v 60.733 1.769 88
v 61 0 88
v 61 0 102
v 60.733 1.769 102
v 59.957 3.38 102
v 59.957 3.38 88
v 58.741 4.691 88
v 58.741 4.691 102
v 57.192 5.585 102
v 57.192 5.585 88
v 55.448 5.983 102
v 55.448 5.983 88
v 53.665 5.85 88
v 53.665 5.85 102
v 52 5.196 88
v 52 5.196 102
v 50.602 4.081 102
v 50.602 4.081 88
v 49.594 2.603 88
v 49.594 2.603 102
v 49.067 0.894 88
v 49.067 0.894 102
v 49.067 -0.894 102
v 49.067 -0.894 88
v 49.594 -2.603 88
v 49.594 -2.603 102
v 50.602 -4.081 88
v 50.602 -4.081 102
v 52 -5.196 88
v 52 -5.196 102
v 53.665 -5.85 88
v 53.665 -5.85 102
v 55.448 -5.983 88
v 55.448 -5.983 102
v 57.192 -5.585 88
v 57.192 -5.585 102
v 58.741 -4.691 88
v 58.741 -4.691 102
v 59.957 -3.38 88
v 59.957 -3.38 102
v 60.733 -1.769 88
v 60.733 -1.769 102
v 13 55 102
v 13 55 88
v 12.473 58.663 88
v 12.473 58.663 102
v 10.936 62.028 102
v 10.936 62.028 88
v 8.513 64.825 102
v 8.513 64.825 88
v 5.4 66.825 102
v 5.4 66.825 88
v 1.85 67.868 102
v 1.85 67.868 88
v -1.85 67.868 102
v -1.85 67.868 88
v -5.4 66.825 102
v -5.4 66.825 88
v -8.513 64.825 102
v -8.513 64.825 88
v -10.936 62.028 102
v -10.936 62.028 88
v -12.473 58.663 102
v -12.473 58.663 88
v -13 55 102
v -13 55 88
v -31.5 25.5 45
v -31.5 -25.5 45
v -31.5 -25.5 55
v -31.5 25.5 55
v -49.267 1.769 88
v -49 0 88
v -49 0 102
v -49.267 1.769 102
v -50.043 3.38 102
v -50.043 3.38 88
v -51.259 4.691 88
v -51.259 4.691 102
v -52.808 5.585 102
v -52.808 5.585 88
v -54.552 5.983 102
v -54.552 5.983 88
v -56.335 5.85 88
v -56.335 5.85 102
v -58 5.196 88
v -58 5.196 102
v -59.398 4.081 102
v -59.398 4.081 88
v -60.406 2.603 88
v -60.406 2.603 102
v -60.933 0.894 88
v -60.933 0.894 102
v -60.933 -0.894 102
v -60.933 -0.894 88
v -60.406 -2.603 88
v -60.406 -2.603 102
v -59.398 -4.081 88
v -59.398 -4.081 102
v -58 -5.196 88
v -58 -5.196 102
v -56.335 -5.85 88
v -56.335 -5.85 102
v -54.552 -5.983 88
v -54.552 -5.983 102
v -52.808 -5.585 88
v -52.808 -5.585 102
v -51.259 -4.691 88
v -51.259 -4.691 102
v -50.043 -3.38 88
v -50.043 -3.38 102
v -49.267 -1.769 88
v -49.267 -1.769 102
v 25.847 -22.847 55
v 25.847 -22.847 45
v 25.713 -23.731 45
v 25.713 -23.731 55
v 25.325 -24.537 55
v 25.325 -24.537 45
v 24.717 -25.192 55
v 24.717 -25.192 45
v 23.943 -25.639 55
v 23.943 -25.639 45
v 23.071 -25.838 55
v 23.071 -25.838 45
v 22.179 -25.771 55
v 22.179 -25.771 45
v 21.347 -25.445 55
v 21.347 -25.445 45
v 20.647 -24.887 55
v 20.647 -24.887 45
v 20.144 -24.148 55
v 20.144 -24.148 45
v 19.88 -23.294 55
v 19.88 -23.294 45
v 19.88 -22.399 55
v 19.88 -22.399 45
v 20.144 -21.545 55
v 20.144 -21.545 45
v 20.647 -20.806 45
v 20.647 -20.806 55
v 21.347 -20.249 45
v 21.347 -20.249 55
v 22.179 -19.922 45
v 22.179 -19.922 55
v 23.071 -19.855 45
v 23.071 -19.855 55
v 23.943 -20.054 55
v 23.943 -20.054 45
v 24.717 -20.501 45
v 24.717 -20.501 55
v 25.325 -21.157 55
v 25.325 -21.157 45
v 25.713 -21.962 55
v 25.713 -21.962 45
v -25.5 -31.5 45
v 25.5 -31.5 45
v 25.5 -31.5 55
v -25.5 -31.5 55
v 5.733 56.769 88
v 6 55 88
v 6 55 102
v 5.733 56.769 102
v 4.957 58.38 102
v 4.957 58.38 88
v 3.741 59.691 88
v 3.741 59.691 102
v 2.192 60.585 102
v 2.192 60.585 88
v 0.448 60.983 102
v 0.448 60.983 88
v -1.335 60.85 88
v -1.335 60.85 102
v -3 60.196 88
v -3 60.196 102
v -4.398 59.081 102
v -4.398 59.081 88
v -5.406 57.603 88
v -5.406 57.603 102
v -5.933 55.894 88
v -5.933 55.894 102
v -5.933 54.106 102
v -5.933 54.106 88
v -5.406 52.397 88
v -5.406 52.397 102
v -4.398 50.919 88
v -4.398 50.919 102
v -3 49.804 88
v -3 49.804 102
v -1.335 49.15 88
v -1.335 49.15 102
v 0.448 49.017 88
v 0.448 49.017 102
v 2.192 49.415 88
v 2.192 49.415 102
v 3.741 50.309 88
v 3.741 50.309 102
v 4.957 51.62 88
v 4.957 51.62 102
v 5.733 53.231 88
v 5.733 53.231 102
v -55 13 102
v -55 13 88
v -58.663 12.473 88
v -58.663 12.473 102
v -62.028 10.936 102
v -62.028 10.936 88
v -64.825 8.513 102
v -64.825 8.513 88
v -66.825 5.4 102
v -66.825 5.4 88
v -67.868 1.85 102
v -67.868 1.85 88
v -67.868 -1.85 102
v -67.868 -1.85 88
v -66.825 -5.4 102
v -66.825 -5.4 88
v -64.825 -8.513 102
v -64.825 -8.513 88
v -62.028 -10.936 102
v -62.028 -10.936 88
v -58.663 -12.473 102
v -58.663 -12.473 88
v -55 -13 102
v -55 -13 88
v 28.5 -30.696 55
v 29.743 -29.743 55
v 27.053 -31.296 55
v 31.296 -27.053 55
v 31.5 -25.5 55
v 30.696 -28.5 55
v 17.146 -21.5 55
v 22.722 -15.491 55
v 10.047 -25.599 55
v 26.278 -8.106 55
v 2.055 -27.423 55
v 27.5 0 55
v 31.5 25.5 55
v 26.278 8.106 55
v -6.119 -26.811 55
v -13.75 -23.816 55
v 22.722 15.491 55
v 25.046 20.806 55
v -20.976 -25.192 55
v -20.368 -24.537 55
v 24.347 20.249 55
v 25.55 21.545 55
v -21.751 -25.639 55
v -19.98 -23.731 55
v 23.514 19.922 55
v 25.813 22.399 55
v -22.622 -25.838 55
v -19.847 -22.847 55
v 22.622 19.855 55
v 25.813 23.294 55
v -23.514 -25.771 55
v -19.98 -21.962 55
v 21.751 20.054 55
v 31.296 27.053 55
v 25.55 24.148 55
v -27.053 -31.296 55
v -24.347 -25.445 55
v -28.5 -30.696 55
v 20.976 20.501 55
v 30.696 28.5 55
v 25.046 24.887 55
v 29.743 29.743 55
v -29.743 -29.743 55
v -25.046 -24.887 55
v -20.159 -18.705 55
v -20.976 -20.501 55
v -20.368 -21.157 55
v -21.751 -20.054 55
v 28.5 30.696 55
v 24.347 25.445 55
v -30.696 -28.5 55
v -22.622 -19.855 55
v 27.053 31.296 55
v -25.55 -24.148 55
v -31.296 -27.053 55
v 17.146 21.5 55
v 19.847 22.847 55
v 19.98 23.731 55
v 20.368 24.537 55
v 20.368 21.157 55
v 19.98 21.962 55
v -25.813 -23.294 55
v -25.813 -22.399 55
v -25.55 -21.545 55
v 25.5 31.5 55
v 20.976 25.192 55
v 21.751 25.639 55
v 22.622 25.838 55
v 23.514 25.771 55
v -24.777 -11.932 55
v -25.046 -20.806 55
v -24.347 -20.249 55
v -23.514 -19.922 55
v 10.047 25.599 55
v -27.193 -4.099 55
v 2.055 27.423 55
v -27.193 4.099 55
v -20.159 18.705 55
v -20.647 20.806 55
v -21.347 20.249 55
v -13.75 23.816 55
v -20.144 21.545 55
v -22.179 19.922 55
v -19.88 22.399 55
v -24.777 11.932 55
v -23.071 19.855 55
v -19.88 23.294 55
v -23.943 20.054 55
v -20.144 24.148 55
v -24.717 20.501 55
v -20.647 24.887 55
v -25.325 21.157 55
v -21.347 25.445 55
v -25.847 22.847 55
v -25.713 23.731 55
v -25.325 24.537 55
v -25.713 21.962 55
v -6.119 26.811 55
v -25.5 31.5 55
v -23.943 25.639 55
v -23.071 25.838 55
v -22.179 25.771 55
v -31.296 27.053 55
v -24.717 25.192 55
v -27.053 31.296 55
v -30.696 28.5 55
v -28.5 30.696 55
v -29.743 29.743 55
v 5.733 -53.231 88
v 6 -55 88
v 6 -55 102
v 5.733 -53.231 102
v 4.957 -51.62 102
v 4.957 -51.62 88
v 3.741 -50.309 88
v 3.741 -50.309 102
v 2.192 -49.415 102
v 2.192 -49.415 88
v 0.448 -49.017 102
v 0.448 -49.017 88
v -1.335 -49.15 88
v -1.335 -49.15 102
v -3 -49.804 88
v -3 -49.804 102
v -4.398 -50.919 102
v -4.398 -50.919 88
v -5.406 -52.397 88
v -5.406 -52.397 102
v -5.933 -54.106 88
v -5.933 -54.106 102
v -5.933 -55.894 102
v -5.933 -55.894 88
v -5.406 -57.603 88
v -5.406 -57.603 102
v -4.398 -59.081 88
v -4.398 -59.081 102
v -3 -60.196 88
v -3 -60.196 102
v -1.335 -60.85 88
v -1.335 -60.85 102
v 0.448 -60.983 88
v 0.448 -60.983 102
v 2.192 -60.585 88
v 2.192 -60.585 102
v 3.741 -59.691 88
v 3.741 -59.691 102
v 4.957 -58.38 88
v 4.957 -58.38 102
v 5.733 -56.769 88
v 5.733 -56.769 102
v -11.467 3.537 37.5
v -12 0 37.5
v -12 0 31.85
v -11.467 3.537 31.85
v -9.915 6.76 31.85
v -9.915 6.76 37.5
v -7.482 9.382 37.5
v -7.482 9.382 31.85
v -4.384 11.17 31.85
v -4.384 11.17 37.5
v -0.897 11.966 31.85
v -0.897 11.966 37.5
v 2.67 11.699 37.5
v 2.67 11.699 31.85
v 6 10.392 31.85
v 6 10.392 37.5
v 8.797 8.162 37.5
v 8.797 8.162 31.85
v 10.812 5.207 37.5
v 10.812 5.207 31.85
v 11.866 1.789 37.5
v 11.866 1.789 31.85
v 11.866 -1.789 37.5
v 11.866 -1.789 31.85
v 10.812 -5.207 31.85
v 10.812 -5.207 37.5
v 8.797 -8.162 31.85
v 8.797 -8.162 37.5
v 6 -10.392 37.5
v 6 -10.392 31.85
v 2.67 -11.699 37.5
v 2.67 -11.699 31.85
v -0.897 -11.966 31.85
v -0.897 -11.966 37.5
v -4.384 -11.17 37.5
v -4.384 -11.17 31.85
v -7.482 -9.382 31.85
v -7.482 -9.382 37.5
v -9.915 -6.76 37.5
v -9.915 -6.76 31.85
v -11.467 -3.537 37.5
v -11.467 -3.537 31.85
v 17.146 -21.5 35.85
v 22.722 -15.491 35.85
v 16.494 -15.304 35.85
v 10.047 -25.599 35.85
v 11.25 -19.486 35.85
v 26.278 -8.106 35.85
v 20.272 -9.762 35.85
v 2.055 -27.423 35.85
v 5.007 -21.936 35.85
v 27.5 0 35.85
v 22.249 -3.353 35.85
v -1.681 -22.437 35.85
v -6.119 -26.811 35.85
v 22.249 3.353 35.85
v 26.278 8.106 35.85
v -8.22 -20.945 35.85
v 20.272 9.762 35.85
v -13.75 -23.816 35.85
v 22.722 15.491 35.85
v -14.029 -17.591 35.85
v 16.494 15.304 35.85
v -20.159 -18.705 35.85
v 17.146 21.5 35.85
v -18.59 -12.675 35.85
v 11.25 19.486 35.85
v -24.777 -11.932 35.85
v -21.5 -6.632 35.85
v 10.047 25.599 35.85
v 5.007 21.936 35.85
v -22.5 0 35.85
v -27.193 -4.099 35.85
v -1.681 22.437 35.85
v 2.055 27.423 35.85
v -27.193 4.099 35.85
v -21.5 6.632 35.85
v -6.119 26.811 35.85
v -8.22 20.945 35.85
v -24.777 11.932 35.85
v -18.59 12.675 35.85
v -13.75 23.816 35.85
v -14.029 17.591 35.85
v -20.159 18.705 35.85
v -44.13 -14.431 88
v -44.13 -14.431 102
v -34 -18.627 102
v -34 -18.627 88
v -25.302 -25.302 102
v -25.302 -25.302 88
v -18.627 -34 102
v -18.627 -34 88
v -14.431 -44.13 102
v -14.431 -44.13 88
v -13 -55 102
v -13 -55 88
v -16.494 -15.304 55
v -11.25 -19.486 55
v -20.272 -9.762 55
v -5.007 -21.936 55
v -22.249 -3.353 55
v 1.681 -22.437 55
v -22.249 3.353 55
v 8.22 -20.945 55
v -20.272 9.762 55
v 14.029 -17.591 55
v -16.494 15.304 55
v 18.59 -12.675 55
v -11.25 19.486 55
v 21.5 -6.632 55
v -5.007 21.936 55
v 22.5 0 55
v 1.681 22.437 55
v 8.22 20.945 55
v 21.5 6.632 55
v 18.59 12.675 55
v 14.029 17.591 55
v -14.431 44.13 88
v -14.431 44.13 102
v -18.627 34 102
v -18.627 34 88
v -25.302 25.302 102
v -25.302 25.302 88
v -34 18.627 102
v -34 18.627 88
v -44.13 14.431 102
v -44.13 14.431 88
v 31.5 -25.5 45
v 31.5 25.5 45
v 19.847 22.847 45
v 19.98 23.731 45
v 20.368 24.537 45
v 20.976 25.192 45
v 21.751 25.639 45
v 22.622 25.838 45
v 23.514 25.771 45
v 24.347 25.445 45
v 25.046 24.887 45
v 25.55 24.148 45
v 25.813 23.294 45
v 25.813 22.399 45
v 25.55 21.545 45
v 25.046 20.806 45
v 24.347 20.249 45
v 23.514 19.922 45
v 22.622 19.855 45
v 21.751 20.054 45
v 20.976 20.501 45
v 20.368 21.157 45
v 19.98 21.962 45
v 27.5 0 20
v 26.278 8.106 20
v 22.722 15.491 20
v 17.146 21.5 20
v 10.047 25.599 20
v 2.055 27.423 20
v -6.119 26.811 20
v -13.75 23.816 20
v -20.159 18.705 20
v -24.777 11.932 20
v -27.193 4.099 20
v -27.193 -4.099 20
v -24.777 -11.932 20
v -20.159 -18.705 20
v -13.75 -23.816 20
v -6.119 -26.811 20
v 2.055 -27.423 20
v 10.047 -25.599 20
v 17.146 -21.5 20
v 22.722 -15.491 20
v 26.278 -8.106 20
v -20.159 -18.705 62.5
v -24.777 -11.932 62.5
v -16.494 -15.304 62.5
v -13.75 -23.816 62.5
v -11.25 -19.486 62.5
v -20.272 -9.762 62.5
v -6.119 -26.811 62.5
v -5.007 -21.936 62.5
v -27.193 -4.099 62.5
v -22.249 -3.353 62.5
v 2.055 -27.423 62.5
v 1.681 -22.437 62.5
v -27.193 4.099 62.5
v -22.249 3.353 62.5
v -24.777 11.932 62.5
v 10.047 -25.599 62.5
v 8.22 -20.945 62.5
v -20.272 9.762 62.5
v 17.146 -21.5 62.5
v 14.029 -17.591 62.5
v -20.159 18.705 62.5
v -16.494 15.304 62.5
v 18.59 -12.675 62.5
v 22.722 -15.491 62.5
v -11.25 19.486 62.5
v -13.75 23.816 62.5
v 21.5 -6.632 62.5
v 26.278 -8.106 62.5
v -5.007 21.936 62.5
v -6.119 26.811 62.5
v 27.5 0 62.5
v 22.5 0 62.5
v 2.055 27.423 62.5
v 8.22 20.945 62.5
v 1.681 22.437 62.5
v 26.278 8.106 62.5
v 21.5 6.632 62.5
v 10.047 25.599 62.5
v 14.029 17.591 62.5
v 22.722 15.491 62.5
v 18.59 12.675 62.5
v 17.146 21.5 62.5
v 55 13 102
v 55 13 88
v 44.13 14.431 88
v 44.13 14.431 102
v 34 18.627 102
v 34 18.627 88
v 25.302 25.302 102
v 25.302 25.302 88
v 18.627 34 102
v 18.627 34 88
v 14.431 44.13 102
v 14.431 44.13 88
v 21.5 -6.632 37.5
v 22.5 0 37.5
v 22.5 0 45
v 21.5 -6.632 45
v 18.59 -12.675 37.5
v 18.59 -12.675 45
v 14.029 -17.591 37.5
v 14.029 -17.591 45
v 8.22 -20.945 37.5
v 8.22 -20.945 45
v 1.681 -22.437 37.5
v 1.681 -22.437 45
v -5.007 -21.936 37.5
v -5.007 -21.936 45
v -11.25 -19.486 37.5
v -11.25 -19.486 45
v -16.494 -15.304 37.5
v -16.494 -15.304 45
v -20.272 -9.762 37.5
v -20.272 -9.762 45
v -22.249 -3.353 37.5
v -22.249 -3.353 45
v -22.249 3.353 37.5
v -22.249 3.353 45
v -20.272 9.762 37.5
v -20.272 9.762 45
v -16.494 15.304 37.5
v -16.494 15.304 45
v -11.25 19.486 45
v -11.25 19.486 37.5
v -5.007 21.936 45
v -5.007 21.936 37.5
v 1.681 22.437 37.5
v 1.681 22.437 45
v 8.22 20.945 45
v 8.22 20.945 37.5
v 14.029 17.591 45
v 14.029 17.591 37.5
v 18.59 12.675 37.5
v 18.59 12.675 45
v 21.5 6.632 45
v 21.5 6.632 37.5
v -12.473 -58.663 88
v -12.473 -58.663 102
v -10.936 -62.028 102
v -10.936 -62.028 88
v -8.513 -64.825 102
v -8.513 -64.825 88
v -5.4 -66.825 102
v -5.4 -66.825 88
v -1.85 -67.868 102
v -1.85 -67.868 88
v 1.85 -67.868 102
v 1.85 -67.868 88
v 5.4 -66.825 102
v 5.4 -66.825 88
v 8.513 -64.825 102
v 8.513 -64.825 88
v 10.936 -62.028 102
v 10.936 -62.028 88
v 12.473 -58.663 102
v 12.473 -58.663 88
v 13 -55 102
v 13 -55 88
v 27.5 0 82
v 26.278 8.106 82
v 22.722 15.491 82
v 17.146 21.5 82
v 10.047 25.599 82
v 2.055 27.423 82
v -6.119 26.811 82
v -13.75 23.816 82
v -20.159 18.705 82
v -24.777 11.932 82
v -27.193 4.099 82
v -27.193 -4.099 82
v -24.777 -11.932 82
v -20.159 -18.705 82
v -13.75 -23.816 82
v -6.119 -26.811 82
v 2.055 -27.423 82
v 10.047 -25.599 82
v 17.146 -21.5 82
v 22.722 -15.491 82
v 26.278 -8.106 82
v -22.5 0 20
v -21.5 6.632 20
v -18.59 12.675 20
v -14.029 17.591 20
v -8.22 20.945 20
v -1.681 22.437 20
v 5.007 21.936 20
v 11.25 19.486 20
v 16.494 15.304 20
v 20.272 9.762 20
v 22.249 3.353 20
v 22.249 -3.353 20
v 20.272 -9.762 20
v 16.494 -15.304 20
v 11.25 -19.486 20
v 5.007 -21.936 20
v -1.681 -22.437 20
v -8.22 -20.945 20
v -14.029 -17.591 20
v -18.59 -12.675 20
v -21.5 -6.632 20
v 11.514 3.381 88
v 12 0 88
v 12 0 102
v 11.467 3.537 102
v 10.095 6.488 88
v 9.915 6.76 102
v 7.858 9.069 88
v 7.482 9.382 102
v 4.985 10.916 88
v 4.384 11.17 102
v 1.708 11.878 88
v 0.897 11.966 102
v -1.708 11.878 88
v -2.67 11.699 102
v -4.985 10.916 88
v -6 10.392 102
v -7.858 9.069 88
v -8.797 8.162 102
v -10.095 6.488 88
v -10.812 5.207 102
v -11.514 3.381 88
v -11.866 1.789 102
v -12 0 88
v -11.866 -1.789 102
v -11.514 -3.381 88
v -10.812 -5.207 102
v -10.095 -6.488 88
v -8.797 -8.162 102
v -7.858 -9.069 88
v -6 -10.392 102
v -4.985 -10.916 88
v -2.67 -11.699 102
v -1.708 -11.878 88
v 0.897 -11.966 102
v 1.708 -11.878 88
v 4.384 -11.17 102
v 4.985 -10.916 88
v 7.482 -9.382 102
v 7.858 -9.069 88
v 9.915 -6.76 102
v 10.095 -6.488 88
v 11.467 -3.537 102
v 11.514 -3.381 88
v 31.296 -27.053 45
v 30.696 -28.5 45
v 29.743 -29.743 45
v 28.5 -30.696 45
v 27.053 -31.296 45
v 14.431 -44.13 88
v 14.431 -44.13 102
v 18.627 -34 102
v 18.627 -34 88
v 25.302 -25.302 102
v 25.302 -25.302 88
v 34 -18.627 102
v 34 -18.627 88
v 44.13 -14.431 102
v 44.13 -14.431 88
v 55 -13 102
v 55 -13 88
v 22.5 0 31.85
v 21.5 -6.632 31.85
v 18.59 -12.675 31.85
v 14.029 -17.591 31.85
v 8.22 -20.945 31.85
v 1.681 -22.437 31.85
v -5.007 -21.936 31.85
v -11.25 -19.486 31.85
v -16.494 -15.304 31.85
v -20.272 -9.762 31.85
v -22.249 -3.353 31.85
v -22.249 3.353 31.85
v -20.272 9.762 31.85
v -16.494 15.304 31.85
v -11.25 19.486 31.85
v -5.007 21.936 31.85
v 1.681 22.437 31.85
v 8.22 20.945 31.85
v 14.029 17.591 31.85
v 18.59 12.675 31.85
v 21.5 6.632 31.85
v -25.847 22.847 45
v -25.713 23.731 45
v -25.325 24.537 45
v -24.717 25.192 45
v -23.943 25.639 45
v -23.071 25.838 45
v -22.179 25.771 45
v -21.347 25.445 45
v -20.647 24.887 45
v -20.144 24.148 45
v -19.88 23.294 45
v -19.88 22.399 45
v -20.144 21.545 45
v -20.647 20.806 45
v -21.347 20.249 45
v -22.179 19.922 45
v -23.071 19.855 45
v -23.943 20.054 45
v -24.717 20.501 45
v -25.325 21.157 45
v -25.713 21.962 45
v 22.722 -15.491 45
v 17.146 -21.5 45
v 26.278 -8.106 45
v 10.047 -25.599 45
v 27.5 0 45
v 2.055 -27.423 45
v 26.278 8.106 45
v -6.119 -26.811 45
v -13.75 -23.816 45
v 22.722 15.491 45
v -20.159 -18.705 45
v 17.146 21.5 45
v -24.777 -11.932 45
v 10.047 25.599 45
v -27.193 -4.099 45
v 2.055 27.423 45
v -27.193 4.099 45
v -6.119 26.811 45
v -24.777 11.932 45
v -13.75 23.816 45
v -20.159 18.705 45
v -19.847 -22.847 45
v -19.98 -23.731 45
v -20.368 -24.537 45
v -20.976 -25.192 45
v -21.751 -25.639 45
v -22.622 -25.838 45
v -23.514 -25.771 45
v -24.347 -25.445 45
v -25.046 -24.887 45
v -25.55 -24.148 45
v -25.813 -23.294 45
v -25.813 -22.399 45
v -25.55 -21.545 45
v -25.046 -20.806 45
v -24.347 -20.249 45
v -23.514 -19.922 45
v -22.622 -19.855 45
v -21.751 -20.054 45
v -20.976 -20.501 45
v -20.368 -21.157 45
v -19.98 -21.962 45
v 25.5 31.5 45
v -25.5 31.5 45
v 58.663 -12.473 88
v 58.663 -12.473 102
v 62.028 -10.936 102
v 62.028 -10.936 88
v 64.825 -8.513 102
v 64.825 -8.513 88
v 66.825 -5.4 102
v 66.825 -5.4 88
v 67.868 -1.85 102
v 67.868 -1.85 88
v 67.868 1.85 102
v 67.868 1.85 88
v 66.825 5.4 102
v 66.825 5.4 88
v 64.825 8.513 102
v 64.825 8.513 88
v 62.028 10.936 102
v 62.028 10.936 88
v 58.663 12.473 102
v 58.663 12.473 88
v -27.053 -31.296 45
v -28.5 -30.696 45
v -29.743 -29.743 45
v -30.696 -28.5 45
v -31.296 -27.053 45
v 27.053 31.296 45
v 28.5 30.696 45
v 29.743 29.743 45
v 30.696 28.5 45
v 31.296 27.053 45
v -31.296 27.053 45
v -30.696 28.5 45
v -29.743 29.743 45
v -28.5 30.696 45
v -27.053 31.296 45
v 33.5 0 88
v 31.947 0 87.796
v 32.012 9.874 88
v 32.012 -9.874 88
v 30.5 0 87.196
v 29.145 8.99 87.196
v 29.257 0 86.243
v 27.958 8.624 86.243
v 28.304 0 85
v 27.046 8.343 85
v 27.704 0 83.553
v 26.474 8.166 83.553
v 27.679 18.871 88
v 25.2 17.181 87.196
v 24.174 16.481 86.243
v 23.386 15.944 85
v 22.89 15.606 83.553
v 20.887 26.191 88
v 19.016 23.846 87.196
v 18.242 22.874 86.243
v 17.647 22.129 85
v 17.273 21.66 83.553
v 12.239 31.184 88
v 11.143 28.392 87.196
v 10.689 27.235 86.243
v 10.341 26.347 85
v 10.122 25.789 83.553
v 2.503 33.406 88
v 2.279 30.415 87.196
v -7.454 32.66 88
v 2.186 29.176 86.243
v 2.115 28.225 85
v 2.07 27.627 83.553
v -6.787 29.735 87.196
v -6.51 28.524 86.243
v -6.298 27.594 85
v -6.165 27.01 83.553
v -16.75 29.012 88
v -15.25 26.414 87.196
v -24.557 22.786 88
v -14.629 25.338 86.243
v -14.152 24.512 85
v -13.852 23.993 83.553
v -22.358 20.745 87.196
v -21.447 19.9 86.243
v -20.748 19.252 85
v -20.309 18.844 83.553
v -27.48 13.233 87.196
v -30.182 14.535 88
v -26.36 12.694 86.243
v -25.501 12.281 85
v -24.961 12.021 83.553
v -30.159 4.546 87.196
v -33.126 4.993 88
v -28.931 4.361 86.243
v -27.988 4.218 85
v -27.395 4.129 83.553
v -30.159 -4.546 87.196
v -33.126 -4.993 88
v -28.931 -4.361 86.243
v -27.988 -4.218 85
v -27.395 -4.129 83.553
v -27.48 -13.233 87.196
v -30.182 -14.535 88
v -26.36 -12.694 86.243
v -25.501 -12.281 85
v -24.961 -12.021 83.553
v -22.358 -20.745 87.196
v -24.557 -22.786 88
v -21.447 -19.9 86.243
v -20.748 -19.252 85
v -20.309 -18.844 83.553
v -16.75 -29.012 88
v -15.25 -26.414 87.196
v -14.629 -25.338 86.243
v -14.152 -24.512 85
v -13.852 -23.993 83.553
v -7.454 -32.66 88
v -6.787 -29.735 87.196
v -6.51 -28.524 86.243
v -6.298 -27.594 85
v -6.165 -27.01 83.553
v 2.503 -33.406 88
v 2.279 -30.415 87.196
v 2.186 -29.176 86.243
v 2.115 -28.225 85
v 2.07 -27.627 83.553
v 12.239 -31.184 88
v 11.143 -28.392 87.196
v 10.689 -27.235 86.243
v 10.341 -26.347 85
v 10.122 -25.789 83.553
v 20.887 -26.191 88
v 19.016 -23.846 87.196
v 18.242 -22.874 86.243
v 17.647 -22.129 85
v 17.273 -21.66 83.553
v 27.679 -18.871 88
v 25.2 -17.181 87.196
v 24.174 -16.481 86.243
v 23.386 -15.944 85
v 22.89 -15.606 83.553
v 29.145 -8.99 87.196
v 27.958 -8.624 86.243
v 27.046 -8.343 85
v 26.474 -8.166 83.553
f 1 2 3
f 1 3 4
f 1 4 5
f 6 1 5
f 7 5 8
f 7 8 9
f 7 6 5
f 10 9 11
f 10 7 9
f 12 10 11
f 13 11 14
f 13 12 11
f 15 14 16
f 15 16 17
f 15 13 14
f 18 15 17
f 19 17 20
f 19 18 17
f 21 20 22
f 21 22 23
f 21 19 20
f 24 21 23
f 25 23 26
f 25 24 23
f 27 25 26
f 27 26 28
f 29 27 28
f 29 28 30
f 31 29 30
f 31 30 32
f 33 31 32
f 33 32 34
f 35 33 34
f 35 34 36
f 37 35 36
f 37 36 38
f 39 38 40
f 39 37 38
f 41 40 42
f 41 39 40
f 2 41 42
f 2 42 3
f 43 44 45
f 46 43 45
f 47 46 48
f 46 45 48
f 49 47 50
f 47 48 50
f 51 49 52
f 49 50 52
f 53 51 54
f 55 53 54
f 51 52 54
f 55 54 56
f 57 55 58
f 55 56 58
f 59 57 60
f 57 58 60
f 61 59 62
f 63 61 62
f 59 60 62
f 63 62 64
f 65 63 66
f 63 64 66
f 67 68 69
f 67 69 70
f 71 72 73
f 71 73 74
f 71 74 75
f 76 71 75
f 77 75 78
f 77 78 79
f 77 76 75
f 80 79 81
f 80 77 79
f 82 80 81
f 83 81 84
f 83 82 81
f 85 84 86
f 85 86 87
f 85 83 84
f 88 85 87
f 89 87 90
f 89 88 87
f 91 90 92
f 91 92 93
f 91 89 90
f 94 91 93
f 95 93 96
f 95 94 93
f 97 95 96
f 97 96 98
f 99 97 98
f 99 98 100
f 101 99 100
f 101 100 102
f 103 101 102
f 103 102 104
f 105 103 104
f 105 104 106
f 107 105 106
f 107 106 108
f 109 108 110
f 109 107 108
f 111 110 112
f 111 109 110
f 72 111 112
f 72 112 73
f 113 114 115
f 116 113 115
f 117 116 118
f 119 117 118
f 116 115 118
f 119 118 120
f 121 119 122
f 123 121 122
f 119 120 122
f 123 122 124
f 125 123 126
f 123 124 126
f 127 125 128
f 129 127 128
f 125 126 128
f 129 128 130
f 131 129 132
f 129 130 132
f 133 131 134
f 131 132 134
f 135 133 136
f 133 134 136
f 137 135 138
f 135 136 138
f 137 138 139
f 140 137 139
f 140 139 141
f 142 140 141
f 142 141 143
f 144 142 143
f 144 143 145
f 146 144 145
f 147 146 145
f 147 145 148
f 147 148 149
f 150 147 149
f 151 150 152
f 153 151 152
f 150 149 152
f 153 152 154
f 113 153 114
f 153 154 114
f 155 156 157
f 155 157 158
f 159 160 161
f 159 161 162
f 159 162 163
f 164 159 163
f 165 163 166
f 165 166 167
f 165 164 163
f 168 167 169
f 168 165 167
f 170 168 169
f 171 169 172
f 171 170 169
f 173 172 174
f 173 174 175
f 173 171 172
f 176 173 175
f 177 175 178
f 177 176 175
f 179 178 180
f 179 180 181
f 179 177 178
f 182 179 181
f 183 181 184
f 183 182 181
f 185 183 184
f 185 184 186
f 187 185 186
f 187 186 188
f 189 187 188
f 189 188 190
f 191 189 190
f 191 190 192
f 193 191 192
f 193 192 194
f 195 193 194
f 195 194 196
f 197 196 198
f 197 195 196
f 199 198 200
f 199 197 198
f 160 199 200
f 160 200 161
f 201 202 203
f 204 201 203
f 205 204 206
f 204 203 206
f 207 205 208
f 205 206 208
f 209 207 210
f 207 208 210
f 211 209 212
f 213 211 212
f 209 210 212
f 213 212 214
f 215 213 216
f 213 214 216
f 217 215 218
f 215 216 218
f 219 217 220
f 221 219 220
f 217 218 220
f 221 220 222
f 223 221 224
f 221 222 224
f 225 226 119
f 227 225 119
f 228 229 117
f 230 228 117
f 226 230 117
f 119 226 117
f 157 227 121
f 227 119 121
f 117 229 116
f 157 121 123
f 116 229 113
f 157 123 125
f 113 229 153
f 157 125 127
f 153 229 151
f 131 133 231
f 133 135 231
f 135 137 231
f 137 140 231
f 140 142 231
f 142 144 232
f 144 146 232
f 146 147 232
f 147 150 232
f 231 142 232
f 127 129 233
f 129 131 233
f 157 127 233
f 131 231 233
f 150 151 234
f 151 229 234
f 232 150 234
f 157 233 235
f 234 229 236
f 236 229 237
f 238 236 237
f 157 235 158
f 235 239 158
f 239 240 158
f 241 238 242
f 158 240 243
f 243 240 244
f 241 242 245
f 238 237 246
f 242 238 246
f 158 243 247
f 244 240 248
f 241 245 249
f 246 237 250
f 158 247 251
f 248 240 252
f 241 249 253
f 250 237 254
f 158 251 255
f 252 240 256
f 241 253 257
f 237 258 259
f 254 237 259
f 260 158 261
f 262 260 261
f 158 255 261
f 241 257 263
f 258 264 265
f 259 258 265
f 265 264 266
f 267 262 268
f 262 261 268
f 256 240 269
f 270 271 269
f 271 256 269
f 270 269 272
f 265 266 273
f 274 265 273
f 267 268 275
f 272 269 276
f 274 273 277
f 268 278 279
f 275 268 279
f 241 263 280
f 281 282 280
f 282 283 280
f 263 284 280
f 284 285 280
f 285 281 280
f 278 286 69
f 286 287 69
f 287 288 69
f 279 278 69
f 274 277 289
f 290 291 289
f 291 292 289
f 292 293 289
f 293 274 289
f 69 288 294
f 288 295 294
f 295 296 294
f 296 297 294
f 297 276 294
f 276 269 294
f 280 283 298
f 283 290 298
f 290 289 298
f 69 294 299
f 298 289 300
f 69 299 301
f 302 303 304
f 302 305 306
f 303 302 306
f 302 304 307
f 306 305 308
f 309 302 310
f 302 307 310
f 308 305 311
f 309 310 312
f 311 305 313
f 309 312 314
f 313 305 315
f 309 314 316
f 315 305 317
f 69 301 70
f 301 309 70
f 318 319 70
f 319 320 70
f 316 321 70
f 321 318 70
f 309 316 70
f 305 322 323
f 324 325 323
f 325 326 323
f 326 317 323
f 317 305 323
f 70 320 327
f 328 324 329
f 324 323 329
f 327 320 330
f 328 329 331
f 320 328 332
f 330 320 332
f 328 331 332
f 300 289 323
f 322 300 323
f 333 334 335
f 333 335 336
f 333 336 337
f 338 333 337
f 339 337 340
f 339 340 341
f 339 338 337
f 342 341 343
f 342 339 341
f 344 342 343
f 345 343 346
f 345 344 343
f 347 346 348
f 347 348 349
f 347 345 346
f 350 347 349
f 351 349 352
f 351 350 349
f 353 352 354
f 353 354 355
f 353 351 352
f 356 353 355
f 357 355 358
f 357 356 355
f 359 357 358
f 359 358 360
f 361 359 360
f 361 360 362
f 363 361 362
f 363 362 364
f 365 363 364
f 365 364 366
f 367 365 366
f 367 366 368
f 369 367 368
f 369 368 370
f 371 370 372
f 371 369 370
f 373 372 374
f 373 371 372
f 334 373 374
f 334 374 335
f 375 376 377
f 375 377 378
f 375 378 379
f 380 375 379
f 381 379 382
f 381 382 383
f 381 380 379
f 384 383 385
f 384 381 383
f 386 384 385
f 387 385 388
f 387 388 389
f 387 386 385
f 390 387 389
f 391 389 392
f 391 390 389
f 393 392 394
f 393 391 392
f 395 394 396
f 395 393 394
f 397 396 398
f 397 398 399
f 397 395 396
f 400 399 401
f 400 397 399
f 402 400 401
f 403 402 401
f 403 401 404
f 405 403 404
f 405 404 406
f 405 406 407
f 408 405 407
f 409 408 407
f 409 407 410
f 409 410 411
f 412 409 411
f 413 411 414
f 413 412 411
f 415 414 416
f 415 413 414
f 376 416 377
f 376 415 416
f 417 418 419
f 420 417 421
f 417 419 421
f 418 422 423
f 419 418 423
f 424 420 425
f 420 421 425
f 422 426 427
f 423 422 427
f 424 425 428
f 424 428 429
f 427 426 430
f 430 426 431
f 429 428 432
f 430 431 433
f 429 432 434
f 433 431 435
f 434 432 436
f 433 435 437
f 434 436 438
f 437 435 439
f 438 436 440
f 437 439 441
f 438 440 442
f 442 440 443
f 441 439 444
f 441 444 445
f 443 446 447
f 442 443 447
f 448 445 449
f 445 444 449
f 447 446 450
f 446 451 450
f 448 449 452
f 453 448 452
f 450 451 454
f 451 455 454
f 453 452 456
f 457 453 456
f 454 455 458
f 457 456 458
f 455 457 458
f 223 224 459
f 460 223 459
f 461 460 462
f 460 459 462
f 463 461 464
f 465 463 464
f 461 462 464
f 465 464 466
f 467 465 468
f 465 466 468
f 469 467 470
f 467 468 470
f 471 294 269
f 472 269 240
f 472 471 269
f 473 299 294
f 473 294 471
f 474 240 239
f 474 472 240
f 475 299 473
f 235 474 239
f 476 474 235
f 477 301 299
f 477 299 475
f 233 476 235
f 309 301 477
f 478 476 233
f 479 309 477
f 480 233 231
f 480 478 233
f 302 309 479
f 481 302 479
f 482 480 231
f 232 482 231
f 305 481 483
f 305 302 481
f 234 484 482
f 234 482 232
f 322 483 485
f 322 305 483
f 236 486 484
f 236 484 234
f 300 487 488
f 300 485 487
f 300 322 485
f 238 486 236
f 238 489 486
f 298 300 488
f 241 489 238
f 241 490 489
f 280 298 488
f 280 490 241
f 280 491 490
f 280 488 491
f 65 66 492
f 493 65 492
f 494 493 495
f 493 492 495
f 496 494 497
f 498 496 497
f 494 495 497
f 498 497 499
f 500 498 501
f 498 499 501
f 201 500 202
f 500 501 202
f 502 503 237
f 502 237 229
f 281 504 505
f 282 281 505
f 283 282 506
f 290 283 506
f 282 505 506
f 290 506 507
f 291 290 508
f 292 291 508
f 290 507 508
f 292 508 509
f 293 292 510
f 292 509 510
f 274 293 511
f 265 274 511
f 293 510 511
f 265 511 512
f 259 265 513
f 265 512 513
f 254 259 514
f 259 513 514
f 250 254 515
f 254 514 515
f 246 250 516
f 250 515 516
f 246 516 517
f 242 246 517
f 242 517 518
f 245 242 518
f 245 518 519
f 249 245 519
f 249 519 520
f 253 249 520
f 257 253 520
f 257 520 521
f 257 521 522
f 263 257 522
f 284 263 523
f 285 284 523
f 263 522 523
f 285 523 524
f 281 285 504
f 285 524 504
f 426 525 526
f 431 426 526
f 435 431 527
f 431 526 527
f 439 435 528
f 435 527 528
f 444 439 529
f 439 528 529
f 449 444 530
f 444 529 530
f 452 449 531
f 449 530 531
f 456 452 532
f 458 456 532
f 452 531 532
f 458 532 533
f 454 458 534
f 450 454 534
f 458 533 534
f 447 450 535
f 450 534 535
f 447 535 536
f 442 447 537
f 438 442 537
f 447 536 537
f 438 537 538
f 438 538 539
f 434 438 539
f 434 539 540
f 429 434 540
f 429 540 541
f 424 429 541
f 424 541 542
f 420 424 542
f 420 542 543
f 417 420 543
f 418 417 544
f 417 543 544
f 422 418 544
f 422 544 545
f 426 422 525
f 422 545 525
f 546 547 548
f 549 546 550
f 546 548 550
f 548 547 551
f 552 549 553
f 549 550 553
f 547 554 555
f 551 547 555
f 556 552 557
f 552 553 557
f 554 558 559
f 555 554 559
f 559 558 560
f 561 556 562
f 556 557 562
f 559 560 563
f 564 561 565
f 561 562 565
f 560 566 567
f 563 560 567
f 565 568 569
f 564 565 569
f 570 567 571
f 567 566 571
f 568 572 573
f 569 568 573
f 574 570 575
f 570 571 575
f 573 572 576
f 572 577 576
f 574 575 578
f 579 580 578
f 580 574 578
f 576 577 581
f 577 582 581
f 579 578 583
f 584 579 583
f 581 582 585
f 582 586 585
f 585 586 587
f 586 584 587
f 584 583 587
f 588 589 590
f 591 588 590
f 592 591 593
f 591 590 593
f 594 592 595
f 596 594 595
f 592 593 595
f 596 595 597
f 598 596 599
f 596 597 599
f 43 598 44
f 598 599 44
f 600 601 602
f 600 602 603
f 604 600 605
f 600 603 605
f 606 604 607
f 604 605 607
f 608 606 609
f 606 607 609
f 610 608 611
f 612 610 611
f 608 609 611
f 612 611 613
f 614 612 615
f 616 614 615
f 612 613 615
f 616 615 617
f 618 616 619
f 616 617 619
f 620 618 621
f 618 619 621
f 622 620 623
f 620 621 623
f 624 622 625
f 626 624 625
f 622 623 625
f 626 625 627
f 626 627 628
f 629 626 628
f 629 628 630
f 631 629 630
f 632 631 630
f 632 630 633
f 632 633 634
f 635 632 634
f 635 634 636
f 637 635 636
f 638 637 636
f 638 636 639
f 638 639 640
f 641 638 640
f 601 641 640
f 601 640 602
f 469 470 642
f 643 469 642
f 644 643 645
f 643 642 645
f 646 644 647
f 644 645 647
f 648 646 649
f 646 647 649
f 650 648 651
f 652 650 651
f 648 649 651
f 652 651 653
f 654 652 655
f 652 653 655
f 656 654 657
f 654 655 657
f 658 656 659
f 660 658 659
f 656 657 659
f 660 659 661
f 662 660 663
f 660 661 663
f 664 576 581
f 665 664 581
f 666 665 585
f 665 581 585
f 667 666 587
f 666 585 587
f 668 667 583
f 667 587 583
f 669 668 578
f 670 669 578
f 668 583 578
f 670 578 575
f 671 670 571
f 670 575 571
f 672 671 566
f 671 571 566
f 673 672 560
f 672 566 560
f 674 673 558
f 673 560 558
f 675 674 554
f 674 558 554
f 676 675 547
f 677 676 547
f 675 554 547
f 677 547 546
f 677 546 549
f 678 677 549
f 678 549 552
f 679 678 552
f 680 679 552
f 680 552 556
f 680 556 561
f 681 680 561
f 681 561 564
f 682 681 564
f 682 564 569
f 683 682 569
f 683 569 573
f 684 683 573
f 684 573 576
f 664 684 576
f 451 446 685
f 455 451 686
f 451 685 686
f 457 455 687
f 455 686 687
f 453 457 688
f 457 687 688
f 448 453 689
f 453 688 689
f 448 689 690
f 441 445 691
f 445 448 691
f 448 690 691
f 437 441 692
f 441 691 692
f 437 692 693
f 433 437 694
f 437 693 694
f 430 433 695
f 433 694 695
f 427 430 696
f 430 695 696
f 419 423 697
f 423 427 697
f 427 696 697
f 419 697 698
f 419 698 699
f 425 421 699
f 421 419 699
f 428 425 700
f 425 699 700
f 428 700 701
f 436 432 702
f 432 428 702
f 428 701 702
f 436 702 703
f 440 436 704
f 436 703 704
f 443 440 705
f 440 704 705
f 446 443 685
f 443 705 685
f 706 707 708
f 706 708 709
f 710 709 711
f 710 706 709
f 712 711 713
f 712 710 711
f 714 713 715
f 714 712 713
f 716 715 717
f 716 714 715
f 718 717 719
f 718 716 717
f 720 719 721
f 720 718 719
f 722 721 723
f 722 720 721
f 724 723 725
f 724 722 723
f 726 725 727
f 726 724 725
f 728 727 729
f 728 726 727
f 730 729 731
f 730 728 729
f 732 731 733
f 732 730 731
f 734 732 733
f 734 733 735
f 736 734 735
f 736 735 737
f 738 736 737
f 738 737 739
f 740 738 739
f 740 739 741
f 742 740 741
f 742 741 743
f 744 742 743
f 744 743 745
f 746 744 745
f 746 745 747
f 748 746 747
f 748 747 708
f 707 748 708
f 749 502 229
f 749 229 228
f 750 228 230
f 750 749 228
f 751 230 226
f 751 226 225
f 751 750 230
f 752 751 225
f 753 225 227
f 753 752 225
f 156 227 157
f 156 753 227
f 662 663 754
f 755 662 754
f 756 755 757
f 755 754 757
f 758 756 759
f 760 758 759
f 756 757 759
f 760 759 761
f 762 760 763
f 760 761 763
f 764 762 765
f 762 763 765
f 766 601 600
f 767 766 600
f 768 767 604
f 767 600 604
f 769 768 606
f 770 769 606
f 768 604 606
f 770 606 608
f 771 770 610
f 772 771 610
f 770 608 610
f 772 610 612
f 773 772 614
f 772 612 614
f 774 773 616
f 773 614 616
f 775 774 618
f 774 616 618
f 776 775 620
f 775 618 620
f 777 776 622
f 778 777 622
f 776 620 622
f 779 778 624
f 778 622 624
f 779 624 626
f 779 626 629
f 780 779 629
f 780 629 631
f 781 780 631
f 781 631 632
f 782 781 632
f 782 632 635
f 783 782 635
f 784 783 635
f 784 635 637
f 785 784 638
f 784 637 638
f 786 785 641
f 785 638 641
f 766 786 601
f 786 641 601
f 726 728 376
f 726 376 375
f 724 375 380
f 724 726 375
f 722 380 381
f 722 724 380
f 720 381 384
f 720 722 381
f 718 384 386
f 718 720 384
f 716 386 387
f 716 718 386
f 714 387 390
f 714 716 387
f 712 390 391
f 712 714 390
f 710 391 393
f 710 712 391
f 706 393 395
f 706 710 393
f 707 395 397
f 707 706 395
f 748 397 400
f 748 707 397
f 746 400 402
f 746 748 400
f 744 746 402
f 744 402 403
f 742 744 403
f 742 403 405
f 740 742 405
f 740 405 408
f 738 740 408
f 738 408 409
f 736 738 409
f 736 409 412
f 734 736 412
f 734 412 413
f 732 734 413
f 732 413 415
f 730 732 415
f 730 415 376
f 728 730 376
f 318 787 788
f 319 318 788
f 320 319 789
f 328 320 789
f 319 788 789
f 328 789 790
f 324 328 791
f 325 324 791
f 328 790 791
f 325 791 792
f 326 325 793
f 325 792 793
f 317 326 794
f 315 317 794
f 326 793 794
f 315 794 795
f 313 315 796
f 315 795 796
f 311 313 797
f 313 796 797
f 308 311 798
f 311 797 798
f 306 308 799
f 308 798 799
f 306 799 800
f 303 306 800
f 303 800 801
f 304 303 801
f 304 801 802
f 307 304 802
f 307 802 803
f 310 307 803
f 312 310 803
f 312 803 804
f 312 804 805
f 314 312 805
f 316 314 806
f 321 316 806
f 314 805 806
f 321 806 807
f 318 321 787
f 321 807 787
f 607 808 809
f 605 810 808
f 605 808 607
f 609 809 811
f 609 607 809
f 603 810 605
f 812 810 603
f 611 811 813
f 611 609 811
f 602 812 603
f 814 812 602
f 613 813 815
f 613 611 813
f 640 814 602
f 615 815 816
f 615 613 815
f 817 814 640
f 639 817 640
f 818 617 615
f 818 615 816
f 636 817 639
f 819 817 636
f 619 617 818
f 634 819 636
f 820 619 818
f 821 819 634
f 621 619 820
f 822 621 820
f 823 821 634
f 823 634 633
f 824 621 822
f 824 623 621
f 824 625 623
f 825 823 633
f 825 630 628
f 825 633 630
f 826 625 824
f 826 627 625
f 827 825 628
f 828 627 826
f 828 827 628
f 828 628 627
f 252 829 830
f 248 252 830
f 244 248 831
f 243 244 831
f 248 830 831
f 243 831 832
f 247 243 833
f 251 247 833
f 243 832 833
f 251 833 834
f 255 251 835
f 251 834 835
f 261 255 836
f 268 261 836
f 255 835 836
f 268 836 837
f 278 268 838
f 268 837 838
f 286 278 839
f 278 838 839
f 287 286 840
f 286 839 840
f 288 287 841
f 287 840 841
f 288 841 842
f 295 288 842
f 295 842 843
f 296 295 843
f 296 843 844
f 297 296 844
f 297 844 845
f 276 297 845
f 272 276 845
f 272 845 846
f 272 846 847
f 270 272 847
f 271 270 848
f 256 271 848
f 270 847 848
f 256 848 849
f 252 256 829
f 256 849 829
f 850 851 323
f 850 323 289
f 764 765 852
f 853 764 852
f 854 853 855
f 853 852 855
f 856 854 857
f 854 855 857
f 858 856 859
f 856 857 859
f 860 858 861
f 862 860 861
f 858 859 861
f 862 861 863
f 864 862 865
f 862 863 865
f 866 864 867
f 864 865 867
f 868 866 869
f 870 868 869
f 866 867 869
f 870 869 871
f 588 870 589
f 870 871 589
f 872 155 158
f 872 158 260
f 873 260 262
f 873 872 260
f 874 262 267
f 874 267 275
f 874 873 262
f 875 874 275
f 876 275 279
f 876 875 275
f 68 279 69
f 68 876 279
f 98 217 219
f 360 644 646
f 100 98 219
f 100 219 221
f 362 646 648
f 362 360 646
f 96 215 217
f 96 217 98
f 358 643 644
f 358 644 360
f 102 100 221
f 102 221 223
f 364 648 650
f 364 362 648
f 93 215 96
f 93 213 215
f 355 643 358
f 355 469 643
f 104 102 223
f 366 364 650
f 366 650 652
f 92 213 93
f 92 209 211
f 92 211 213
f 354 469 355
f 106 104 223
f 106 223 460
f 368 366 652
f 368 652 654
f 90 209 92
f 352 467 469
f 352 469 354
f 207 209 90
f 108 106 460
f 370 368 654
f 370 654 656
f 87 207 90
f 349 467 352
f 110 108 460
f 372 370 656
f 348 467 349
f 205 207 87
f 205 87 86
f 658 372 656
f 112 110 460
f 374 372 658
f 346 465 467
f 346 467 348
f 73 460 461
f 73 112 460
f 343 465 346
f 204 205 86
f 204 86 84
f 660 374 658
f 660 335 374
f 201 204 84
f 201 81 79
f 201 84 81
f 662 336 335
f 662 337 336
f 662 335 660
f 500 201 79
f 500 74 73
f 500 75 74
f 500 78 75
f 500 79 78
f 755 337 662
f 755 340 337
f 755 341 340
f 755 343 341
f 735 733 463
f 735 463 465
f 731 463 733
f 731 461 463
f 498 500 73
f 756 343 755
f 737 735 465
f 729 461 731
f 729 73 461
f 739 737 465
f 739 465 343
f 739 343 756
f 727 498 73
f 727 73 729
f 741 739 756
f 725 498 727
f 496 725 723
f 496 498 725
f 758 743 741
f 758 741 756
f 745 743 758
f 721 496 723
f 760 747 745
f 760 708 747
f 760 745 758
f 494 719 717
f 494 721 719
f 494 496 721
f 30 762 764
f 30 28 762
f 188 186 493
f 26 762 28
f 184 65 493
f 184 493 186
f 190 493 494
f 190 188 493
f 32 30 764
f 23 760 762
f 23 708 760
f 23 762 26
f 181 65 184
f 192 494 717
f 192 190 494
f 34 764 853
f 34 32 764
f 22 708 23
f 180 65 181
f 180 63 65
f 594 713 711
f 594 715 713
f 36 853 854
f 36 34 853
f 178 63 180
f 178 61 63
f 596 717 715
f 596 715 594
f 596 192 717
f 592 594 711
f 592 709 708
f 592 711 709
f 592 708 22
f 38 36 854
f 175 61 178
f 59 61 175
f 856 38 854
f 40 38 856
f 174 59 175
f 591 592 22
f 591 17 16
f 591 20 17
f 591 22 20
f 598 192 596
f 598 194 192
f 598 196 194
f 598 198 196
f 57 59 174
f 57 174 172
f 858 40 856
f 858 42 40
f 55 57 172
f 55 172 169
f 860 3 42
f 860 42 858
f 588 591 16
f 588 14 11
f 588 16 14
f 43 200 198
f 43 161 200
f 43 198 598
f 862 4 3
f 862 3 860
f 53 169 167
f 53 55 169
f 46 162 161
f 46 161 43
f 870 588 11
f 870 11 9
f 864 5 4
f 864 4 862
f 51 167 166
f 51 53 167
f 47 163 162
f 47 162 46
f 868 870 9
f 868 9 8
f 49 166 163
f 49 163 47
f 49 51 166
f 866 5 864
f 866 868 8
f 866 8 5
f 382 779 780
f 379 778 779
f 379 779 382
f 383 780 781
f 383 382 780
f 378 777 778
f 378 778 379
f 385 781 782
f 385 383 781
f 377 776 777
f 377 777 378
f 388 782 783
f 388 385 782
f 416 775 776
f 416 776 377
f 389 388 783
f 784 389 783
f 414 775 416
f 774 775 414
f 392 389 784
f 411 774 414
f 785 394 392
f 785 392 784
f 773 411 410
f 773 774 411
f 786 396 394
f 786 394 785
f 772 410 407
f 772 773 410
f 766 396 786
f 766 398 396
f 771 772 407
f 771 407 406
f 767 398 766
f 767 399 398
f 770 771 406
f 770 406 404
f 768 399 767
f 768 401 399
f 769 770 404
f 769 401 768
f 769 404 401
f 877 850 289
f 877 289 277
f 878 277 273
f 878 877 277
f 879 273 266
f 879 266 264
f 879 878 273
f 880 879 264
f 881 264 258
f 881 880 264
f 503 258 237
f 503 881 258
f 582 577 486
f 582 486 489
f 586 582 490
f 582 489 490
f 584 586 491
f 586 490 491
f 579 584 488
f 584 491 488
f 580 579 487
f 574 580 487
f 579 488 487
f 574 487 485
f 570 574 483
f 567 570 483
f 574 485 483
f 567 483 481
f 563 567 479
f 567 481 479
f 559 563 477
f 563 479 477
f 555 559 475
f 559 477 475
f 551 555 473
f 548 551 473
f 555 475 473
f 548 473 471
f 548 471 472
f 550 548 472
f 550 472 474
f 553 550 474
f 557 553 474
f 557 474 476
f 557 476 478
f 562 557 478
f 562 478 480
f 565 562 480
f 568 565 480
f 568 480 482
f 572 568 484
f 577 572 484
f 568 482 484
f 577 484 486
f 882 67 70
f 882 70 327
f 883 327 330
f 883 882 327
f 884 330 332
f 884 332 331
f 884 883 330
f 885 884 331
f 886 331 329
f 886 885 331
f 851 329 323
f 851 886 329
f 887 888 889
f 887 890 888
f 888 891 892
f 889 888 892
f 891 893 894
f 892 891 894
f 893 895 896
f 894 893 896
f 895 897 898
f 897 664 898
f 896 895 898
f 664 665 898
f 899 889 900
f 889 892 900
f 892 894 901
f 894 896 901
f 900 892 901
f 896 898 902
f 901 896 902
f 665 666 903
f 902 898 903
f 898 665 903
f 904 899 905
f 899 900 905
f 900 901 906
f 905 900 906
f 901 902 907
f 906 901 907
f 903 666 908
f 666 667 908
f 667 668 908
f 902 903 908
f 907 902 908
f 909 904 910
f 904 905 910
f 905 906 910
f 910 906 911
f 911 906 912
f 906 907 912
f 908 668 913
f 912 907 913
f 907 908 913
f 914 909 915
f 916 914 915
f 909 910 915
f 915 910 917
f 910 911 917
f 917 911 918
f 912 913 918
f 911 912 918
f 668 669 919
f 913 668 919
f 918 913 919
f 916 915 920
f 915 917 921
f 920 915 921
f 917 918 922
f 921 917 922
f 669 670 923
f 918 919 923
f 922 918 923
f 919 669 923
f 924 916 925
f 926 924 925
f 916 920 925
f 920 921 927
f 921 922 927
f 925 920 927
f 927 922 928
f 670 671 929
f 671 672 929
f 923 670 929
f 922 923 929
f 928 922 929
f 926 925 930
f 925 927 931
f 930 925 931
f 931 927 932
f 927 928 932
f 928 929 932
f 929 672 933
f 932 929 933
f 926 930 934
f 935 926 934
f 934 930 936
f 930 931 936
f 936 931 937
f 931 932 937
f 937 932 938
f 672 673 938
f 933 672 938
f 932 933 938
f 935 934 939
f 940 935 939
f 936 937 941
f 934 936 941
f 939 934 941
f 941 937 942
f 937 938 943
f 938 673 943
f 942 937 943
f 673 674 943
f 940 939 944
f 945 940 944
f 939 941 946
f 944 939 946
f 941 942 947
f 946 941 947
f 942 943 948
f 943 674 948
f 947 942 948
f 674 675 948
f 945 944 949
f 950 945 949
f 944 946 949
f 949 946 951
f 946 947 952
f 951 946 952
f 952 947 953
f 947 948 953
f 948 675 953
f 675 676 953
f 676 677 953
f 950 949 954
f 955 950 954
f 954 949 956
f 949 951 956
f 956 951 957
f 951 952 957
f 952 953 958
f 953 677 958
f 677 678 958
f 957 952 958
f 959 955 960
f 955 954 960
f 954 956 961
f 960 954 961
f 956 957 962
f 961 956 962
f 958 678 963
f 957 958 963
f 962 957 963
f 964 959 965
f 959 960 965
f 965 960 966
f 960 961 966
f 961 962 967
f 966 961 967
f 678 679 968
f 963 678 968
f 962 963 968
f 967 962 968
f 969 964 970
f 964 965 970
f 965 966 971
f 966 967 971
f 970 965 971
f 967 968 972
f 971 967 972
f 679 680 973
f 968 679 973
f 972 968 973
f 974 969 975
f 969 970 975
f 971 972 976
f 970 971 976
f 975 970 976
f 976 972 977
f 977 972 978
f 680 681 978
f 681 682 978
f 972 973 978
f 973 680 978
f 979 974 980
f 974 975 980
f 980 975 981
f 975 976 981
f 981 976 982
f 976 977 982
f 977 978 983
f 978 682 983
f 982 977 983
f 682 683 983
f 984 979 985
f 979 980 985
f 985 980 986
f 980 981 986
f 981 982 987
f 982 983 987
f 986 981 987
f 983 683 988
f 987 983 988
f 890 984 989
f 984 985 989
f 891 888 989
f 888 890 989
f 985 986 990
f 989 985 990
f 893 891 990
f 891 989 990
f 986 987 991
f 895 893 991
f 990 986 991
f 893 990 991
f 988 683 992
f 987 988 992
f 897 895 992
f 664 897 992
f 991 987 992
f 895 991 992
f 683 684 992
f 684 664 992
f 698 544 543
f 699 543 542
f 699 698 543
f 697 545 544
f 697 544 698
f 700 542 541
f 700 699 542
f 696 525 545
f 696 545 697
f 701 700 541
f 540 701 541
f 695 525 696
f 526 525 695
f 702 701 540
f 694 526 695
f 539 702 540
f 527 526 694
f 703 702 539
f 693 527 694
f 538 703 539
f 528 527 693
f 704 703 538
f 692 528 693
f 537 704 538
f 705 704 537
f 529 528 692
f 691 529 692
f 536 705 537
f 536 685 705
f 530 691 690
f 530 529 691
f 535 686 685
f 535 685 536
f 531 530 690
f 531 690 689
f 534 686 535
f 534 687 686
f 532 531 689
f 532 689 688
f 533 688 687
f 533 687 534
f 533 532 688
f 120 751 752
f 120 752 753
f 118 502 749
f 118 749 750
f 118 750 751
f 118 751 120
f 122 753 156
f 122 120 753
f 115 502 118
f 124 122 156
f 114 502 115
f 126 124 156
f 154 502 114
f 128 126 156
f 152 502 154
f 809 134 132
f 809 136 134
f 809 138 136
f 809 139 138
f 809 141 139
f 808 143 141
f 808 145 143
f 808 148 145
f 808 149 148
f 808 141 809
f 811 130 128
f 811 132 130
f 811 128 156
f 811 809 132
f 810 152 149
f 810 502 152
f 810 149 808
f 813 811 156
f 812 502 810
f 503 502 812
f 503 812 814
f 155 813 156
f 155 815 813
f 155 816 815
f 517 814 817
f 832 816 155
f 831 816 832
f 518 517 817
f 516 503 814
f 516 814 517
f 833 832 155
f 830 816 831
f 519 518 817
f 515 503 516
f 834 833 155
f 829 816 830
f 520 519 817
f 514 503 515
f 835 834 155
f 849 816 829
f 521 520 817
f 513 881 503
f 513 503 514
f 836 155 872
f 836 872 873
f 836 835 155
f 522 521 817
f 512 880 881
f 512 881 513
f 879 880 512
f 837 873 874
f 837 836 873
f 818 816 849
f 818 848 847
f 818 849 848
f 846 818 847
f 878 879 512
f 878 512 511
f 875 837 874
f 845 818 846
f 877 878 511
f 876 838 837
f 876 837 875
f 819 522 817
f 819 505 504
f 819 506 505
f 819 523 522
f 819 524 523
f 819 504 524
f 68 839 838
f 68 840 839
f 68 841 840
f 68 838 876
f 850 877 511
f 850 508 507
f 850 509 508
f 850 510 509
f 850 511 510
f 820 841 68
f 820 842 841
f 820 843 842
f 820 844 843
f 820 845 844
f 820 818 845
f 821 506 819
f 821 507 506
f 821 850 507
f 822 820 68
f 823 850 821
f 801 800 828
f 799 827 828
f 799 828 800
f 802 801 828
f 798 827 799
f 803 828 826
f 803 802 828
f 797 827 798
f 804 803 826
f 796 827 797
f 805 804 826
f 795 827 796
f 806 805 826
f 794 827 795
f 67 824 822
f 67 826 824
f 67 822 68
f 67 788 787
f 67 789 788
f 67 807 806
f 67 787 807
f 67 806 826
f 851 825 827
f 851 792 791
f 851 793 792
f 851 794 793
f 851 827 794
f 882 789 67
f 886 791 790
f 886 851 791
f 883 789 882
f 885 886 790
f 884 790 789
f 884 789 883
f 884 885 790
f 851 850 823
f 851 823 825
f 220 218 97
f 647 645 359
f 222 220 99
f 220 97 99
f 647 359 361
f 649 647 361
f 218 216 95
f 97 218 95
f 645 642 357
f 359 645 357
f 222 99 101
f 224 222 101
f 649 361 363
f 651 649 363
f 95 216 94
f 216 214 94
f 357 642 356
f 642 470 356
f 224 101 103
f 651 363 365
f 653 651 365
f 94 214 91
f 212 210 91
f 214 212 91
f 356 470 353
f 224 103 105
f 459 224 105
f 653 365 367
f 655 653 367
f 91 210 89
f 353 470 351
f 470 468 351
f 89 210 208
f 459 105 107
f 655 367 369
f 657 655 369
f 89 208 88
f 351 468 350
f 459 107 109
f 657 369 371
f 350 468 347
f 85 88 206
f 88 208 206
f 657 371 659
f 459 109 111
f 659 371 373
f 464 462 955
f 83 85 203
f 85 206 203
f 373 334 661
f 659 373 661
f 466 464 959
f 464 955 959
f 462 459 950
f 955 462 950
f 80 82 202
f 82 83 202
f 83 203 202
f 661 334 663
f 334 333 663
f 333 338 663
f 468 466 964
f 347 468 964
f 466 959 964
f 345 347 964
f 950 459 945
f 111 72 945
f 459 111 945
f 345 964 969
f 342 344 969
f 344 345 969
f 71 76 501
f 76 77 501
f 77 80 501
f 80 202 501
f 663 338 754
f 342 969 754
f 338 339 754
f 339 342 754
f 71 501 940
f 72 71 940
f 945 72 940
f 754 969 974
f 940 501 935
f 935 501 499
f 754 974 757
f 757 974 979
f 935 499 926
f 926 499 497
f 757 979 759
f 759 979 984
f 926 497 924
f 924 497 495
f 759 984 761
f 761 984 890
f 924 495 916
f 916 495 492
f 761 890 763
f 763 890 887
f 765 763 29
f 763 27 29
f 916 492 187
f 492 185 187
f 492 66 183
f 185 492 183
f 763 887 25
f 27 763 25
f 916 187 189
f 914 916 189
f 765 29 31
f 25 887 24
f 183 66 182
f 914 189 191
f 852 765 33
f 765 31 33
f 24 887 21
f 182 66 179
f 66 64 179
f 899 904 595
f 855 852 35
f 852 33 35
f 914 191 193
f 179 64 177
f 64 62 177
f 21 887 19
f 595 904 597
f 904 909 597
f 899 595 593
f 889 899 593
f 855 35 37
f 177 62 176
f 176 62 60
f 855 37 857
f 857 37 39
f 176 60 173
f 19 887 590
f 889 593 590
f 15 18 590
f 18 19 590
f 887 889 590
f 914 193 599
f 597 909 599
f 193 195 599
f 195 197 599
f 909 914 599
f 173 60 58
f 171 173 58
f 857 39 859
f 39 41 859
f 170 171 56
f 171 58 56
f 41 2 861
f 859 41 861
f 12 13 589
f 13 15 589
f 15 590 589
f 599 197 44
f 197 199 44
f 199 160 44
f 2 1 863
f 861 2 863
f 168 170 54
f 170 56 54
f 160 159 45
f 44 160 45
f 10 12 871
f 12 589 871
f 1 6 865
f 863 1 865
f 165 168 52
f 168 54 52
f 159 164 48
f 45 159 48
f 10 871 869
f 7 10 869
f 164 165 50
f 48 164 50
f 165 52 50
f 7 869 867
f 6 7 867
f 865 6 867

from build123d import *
from build123d.topology import SkipClean

# Parameters (mm, degrees)
SKETCH1_R                = 27.5
SKETCH1_R_2              = 20
BOSS_EXTRUDE1_DEPTH      = 88
SKETCH2_R                = 3
SKETCH2_R_2              = 27.5
BOSS_EXTRUDE2_DEPTH      = 10
SKETCH3_R                = 6
SKETCH3_R_2              = 12
BOSS_EXTRUDE3_DEPTH      = 14
FILLET3_R                = 6
BOSS_EXTRUDE4_DEPTH      = 7.5
BOSS_EXTRUDE4_DEPTH_BACK = 43
SKETCH6_R                = 20
SKETCH6_R_2              = 12
SKETCH7_R                = 27.5
CUT_EXTRUDE1_DEPTH       = 20
SKETCH8_R                = 22.5
CUT_EXTRUDE2_DEPTH       = 17.5
CUT_EXTRUDE5_DEPTH       = 1.9
CUT_EXTRUDE5_DEPTH_BACK  = 7.25
SKETCH11_R               = 27.5
SKETCH11_R_2             = 22.5
SKETCH12_R               = 27.5
SKETCH12_R_2             = 22.5
BOSS_EXTRUDE5_DEPTH      = 15.85
SKETCH13_R               = 22.5
SKETCH13_R_2             = 12
BOSS_EXTRUDE6_DEPTH      = 5.65
SKETCH15_R               = 27.5
SKETCH15_R_2             = 22.5
CUT_EXTRUDE7_DEPTH       = 7.5


with BuildPart() as part:
    # Sketch1 → Boss-Extrude1 (new body)
    with BuildSketch(Plane.XY):
        Circle(SKETCH1_R)
        Circle(SKETCH1_R_2, mode=Mode.SUBTRACT)
    extrude(amount=BOSS_EXTRUDE1_DEPTH)

    # Sketch2 → Boss-Extrude2 (add)
    with BuildSketch(Plane(origin=(0, 0, 45), x_dir=(-1, 0, 0), z_dir=(0, 0, -1))):
        with BuildLine():
            Line((-25.5, -31.5), (25.5, -31.5))
            ThreePointArc((25.5, -31.5), (29.742640687, -29.742640687), (31.5, -25.5))
            Line((31.5, -25.5), (31.5, 25.5))
            ThreePointArc((31.5, 25.5), (29.742640687, 29.742640687), (25.5, 31.5))
            Line((25.5, 31.5), (-25.5, 31.5))
            ThreePointArc((-25.5, 31.5), (-29.742640687, 29.742640687), (-31.5, 25.5))
            Line((-31.5, 25.5), (-31.5, -25.5))
            ThreePointArc((-31.5, -25.5), (-29.742640687, -29.742640687), (-25.5, -31.5))
        make_face()
        with Locations((22.8466201, 22.8466201)):
            Circle(SKETCH2_R, mode=Mode.SUBTRACT)
        with Locations(Location((-22.8466201, -22.8466201, 0), (0, 0, 180))):
            Circle(SKETCH2_R, mode=Mode.SUBTRACT)
        with Locations(Location((22.8466201, -22.8466201, 0), (0, 0, 180))):
            Circle(SKETCH2_R, mode=Mode.SUBTRACT)
        with Locations((-22.8466201, 22.8466201)):
            Circle(SKETCH2_R, mode=Mode.SUBTRACT)
        Circle(SKETCH2_R_2, mode=Mode.SUBTRACT)
    extrude(amount=-BOSS_EXTRUDE2_DEPTH)

    # Sketch3 → Boss-Extrude3 (add)
    with BuildSketch(Plane.XY.offset(88)):
        with BuildLine():
            ThreePointArc((55, 13), (25.30151519, 25.30151519), (13, 55))
            ThreePointArc((13, 55), (0, 68), (-13, 55))
            ThreePointArc((-13, 55), (-25.30151519, 25.30151519), (-55, 13))
            ThreePointArc((-55, 13), (-68, 0), (-55, -13))
            ThreePointArc((-55, -13), (-25.30151519, -25.30151519), (-13, -55))
            ThreePointArc((-13, -55), (0, -68), (13, -55))
            ThreePointArc((13, -55), (25.30151519, -25.30151519), (55, -13))
            ThreePointArc((55, -13), (68, 0), (55, 13))
        make_face()
        with Locations((0, -55)):
            Circle(SKETCH3_R, mode=Mode.SUBTRACT)
        with Locations((-55, 0)):
            Circle(SKETCH3_R, mode=Mode.SUBTRACT)
        Circle(SKETCH3_R_2, mode=Mode.SUBTRACT)
        with Locations((55, 0)):
            Circle(SKETCH3_R, mode=Mode.SUBTRACT)
        with Locations((0, 55)):
            Circle(SKETCH3_R, mode=Mode.SUBTRACT)
    extrude(amount=BOSS_EXTRUDE3_DEPTH)

    # Fillet3
    fillet3_edges = [part.edges().sort_by_distance(p)[0] for p in [
        (-27.5, 0, 88),
    ]]
    fillet(fillet3_edges, radius=FILLET3_R)

    # Sketch6 → Boss-Extrude4 (add, two sides: drawn at the far end of the back side and taken through both)
    with SkipClean():  # the faces are left unmerged after this step: merging them gives an invalid solid
        with BuildSketch(Plane(origin=(0, 0, 45), x_dir=(-1, 0, 0), z_dir=(0, 0, -1)).offset(-BOSS_EXTRUDE4_DEPTH_BACK)):
            Circle(SKETCH6_R)
            Circle(SKETCH6_R_2, mode=Mode.SUBTRACT)
        extrude(amount=BOSS_EXTRUDE4_DEPTH + BOSS_EXTRUDE4_DEPTH_BACK)

    # Sketch7 → Cut-Extrude1 (cut)
    with SkipClean():  # the faces are left unmerged after this step: merging them gives an invalid solid
        with BuildSketch(Plane(origin=(0, 0, 0), x_dir=(-1, 0, 0), z_dir=(0, 0, -1))):
            Circle(SKETCH7_R)
        extrude(amount=-CUT_EXTRUDE1_DEPTH, mode=Mode.SUBTRACT)

    # Sketch8 → Cut-Extrude2 (cut)
    with SkipClean():  # the faces are left unmerged after this step: merging them gives an invalid solid
        with BuildSketch(Plane(origin=(0, 0, 20), x_dir=(-1, 0, 0), z_dir=(0, 0, -1))):
            Circle(SKETCH8_R)
        extrude(amount=-CUT_EXTRUDE2_DEPTH, mode=Mode.SUBTRACT)

    # Sketch11 → Cut-Extrude5 (cut, two sides: drawn at the far end of the back side and taken through both)
    with SkipClean():  # the faces are left unmerged after this step: merging them gives an invalid solid
        with BuildSketch(Plane(origin=(0, 0, 37.75), x_dir=(-1, 0, 0), z_dir=(0, 0, -1)).offset(-CUT_EXTRUDE5_DEPTH_BACK)):
            Circle(SKETCH11_R)
            with Locations(Location((0, 0, 0), (0, 0, 180))):
                Circle(SKETCH11_R_2, mode=Mode.SUBTRACT)
        extrude(amount=CUT_EXTRUDE5_DEPTH + CUT_EXTRUDE5_DEPTH_BACK, mode=Mode.SUBTRACT)


with BuildPart() as cut_extrude5_piece_1:
    # of the separate pieces the step leaves, piece 1, a body of its own (cut_extrude5_pieces)
    add(part.part.solids().sort_by_distance((33.5, 0, 88))[0])

    # Sketch13 → Boss-Extrude6 (add)
    with SkipClean():  # the faces are left unmerged after this step: merging them gives an invalid solid
        with BuildSketch(Plane(origin=(0, 0, 37.5), x_dir=(-1, 0, 0), z_dir=(0, 0, -1))):
            with Locations(Location((0, 0, 0), (0, 0, 180))):
                Circle(SKETCH13_R)
            Circle(SKETCH13_R_2, mode=Mode.SUBTRACT)
        extrude(amount=BOSS_EXTRUDE6_DEPTH)

    # Sketch15 → Cut-Extrude7 (cut)
    with SkipClean():  # the faces are left unmerged after this step: merging them gives an invalid solid
        with BuildSketch(Plane.XY.offset(55)):
            Circle(SKETCH15_R)
            Circle(SKETCH15_R_2, mode=Mode.SUBTRACT)
        extrude(amount=CUT_EXTRUDE7_DEPTH, mode=Mode.SUBTRACT)


with BuildPart() as cut_extrude5_piece_2:
    # of the separate pieces the step leaves, piece 2, a body of its own (cut_extrude5_pieces)
    add(part.part.solids().sort_by_distance((27.5, 0, 20))[0])

    # Sketch12 → Boss-Extrude5 (add)
    with BuildSketch(Plane(origin=(0, 0, 20), x_dir=(-1, 0, 0), z_dir=(0, 0, -1))):
        Circle(SKETCH12_R)
        with Locations(Location((0, 0, 0), (0, 0, 180))):
            Circle(SKETCH12_R_2, mode=Mode.SUBTRACT)
    extrude(amount=-BOSS_EXTRUDE5_DEPTH)


solid = Compound([cut_extrude5_piece_1.part, cut_extrude5_piece_2.part])
